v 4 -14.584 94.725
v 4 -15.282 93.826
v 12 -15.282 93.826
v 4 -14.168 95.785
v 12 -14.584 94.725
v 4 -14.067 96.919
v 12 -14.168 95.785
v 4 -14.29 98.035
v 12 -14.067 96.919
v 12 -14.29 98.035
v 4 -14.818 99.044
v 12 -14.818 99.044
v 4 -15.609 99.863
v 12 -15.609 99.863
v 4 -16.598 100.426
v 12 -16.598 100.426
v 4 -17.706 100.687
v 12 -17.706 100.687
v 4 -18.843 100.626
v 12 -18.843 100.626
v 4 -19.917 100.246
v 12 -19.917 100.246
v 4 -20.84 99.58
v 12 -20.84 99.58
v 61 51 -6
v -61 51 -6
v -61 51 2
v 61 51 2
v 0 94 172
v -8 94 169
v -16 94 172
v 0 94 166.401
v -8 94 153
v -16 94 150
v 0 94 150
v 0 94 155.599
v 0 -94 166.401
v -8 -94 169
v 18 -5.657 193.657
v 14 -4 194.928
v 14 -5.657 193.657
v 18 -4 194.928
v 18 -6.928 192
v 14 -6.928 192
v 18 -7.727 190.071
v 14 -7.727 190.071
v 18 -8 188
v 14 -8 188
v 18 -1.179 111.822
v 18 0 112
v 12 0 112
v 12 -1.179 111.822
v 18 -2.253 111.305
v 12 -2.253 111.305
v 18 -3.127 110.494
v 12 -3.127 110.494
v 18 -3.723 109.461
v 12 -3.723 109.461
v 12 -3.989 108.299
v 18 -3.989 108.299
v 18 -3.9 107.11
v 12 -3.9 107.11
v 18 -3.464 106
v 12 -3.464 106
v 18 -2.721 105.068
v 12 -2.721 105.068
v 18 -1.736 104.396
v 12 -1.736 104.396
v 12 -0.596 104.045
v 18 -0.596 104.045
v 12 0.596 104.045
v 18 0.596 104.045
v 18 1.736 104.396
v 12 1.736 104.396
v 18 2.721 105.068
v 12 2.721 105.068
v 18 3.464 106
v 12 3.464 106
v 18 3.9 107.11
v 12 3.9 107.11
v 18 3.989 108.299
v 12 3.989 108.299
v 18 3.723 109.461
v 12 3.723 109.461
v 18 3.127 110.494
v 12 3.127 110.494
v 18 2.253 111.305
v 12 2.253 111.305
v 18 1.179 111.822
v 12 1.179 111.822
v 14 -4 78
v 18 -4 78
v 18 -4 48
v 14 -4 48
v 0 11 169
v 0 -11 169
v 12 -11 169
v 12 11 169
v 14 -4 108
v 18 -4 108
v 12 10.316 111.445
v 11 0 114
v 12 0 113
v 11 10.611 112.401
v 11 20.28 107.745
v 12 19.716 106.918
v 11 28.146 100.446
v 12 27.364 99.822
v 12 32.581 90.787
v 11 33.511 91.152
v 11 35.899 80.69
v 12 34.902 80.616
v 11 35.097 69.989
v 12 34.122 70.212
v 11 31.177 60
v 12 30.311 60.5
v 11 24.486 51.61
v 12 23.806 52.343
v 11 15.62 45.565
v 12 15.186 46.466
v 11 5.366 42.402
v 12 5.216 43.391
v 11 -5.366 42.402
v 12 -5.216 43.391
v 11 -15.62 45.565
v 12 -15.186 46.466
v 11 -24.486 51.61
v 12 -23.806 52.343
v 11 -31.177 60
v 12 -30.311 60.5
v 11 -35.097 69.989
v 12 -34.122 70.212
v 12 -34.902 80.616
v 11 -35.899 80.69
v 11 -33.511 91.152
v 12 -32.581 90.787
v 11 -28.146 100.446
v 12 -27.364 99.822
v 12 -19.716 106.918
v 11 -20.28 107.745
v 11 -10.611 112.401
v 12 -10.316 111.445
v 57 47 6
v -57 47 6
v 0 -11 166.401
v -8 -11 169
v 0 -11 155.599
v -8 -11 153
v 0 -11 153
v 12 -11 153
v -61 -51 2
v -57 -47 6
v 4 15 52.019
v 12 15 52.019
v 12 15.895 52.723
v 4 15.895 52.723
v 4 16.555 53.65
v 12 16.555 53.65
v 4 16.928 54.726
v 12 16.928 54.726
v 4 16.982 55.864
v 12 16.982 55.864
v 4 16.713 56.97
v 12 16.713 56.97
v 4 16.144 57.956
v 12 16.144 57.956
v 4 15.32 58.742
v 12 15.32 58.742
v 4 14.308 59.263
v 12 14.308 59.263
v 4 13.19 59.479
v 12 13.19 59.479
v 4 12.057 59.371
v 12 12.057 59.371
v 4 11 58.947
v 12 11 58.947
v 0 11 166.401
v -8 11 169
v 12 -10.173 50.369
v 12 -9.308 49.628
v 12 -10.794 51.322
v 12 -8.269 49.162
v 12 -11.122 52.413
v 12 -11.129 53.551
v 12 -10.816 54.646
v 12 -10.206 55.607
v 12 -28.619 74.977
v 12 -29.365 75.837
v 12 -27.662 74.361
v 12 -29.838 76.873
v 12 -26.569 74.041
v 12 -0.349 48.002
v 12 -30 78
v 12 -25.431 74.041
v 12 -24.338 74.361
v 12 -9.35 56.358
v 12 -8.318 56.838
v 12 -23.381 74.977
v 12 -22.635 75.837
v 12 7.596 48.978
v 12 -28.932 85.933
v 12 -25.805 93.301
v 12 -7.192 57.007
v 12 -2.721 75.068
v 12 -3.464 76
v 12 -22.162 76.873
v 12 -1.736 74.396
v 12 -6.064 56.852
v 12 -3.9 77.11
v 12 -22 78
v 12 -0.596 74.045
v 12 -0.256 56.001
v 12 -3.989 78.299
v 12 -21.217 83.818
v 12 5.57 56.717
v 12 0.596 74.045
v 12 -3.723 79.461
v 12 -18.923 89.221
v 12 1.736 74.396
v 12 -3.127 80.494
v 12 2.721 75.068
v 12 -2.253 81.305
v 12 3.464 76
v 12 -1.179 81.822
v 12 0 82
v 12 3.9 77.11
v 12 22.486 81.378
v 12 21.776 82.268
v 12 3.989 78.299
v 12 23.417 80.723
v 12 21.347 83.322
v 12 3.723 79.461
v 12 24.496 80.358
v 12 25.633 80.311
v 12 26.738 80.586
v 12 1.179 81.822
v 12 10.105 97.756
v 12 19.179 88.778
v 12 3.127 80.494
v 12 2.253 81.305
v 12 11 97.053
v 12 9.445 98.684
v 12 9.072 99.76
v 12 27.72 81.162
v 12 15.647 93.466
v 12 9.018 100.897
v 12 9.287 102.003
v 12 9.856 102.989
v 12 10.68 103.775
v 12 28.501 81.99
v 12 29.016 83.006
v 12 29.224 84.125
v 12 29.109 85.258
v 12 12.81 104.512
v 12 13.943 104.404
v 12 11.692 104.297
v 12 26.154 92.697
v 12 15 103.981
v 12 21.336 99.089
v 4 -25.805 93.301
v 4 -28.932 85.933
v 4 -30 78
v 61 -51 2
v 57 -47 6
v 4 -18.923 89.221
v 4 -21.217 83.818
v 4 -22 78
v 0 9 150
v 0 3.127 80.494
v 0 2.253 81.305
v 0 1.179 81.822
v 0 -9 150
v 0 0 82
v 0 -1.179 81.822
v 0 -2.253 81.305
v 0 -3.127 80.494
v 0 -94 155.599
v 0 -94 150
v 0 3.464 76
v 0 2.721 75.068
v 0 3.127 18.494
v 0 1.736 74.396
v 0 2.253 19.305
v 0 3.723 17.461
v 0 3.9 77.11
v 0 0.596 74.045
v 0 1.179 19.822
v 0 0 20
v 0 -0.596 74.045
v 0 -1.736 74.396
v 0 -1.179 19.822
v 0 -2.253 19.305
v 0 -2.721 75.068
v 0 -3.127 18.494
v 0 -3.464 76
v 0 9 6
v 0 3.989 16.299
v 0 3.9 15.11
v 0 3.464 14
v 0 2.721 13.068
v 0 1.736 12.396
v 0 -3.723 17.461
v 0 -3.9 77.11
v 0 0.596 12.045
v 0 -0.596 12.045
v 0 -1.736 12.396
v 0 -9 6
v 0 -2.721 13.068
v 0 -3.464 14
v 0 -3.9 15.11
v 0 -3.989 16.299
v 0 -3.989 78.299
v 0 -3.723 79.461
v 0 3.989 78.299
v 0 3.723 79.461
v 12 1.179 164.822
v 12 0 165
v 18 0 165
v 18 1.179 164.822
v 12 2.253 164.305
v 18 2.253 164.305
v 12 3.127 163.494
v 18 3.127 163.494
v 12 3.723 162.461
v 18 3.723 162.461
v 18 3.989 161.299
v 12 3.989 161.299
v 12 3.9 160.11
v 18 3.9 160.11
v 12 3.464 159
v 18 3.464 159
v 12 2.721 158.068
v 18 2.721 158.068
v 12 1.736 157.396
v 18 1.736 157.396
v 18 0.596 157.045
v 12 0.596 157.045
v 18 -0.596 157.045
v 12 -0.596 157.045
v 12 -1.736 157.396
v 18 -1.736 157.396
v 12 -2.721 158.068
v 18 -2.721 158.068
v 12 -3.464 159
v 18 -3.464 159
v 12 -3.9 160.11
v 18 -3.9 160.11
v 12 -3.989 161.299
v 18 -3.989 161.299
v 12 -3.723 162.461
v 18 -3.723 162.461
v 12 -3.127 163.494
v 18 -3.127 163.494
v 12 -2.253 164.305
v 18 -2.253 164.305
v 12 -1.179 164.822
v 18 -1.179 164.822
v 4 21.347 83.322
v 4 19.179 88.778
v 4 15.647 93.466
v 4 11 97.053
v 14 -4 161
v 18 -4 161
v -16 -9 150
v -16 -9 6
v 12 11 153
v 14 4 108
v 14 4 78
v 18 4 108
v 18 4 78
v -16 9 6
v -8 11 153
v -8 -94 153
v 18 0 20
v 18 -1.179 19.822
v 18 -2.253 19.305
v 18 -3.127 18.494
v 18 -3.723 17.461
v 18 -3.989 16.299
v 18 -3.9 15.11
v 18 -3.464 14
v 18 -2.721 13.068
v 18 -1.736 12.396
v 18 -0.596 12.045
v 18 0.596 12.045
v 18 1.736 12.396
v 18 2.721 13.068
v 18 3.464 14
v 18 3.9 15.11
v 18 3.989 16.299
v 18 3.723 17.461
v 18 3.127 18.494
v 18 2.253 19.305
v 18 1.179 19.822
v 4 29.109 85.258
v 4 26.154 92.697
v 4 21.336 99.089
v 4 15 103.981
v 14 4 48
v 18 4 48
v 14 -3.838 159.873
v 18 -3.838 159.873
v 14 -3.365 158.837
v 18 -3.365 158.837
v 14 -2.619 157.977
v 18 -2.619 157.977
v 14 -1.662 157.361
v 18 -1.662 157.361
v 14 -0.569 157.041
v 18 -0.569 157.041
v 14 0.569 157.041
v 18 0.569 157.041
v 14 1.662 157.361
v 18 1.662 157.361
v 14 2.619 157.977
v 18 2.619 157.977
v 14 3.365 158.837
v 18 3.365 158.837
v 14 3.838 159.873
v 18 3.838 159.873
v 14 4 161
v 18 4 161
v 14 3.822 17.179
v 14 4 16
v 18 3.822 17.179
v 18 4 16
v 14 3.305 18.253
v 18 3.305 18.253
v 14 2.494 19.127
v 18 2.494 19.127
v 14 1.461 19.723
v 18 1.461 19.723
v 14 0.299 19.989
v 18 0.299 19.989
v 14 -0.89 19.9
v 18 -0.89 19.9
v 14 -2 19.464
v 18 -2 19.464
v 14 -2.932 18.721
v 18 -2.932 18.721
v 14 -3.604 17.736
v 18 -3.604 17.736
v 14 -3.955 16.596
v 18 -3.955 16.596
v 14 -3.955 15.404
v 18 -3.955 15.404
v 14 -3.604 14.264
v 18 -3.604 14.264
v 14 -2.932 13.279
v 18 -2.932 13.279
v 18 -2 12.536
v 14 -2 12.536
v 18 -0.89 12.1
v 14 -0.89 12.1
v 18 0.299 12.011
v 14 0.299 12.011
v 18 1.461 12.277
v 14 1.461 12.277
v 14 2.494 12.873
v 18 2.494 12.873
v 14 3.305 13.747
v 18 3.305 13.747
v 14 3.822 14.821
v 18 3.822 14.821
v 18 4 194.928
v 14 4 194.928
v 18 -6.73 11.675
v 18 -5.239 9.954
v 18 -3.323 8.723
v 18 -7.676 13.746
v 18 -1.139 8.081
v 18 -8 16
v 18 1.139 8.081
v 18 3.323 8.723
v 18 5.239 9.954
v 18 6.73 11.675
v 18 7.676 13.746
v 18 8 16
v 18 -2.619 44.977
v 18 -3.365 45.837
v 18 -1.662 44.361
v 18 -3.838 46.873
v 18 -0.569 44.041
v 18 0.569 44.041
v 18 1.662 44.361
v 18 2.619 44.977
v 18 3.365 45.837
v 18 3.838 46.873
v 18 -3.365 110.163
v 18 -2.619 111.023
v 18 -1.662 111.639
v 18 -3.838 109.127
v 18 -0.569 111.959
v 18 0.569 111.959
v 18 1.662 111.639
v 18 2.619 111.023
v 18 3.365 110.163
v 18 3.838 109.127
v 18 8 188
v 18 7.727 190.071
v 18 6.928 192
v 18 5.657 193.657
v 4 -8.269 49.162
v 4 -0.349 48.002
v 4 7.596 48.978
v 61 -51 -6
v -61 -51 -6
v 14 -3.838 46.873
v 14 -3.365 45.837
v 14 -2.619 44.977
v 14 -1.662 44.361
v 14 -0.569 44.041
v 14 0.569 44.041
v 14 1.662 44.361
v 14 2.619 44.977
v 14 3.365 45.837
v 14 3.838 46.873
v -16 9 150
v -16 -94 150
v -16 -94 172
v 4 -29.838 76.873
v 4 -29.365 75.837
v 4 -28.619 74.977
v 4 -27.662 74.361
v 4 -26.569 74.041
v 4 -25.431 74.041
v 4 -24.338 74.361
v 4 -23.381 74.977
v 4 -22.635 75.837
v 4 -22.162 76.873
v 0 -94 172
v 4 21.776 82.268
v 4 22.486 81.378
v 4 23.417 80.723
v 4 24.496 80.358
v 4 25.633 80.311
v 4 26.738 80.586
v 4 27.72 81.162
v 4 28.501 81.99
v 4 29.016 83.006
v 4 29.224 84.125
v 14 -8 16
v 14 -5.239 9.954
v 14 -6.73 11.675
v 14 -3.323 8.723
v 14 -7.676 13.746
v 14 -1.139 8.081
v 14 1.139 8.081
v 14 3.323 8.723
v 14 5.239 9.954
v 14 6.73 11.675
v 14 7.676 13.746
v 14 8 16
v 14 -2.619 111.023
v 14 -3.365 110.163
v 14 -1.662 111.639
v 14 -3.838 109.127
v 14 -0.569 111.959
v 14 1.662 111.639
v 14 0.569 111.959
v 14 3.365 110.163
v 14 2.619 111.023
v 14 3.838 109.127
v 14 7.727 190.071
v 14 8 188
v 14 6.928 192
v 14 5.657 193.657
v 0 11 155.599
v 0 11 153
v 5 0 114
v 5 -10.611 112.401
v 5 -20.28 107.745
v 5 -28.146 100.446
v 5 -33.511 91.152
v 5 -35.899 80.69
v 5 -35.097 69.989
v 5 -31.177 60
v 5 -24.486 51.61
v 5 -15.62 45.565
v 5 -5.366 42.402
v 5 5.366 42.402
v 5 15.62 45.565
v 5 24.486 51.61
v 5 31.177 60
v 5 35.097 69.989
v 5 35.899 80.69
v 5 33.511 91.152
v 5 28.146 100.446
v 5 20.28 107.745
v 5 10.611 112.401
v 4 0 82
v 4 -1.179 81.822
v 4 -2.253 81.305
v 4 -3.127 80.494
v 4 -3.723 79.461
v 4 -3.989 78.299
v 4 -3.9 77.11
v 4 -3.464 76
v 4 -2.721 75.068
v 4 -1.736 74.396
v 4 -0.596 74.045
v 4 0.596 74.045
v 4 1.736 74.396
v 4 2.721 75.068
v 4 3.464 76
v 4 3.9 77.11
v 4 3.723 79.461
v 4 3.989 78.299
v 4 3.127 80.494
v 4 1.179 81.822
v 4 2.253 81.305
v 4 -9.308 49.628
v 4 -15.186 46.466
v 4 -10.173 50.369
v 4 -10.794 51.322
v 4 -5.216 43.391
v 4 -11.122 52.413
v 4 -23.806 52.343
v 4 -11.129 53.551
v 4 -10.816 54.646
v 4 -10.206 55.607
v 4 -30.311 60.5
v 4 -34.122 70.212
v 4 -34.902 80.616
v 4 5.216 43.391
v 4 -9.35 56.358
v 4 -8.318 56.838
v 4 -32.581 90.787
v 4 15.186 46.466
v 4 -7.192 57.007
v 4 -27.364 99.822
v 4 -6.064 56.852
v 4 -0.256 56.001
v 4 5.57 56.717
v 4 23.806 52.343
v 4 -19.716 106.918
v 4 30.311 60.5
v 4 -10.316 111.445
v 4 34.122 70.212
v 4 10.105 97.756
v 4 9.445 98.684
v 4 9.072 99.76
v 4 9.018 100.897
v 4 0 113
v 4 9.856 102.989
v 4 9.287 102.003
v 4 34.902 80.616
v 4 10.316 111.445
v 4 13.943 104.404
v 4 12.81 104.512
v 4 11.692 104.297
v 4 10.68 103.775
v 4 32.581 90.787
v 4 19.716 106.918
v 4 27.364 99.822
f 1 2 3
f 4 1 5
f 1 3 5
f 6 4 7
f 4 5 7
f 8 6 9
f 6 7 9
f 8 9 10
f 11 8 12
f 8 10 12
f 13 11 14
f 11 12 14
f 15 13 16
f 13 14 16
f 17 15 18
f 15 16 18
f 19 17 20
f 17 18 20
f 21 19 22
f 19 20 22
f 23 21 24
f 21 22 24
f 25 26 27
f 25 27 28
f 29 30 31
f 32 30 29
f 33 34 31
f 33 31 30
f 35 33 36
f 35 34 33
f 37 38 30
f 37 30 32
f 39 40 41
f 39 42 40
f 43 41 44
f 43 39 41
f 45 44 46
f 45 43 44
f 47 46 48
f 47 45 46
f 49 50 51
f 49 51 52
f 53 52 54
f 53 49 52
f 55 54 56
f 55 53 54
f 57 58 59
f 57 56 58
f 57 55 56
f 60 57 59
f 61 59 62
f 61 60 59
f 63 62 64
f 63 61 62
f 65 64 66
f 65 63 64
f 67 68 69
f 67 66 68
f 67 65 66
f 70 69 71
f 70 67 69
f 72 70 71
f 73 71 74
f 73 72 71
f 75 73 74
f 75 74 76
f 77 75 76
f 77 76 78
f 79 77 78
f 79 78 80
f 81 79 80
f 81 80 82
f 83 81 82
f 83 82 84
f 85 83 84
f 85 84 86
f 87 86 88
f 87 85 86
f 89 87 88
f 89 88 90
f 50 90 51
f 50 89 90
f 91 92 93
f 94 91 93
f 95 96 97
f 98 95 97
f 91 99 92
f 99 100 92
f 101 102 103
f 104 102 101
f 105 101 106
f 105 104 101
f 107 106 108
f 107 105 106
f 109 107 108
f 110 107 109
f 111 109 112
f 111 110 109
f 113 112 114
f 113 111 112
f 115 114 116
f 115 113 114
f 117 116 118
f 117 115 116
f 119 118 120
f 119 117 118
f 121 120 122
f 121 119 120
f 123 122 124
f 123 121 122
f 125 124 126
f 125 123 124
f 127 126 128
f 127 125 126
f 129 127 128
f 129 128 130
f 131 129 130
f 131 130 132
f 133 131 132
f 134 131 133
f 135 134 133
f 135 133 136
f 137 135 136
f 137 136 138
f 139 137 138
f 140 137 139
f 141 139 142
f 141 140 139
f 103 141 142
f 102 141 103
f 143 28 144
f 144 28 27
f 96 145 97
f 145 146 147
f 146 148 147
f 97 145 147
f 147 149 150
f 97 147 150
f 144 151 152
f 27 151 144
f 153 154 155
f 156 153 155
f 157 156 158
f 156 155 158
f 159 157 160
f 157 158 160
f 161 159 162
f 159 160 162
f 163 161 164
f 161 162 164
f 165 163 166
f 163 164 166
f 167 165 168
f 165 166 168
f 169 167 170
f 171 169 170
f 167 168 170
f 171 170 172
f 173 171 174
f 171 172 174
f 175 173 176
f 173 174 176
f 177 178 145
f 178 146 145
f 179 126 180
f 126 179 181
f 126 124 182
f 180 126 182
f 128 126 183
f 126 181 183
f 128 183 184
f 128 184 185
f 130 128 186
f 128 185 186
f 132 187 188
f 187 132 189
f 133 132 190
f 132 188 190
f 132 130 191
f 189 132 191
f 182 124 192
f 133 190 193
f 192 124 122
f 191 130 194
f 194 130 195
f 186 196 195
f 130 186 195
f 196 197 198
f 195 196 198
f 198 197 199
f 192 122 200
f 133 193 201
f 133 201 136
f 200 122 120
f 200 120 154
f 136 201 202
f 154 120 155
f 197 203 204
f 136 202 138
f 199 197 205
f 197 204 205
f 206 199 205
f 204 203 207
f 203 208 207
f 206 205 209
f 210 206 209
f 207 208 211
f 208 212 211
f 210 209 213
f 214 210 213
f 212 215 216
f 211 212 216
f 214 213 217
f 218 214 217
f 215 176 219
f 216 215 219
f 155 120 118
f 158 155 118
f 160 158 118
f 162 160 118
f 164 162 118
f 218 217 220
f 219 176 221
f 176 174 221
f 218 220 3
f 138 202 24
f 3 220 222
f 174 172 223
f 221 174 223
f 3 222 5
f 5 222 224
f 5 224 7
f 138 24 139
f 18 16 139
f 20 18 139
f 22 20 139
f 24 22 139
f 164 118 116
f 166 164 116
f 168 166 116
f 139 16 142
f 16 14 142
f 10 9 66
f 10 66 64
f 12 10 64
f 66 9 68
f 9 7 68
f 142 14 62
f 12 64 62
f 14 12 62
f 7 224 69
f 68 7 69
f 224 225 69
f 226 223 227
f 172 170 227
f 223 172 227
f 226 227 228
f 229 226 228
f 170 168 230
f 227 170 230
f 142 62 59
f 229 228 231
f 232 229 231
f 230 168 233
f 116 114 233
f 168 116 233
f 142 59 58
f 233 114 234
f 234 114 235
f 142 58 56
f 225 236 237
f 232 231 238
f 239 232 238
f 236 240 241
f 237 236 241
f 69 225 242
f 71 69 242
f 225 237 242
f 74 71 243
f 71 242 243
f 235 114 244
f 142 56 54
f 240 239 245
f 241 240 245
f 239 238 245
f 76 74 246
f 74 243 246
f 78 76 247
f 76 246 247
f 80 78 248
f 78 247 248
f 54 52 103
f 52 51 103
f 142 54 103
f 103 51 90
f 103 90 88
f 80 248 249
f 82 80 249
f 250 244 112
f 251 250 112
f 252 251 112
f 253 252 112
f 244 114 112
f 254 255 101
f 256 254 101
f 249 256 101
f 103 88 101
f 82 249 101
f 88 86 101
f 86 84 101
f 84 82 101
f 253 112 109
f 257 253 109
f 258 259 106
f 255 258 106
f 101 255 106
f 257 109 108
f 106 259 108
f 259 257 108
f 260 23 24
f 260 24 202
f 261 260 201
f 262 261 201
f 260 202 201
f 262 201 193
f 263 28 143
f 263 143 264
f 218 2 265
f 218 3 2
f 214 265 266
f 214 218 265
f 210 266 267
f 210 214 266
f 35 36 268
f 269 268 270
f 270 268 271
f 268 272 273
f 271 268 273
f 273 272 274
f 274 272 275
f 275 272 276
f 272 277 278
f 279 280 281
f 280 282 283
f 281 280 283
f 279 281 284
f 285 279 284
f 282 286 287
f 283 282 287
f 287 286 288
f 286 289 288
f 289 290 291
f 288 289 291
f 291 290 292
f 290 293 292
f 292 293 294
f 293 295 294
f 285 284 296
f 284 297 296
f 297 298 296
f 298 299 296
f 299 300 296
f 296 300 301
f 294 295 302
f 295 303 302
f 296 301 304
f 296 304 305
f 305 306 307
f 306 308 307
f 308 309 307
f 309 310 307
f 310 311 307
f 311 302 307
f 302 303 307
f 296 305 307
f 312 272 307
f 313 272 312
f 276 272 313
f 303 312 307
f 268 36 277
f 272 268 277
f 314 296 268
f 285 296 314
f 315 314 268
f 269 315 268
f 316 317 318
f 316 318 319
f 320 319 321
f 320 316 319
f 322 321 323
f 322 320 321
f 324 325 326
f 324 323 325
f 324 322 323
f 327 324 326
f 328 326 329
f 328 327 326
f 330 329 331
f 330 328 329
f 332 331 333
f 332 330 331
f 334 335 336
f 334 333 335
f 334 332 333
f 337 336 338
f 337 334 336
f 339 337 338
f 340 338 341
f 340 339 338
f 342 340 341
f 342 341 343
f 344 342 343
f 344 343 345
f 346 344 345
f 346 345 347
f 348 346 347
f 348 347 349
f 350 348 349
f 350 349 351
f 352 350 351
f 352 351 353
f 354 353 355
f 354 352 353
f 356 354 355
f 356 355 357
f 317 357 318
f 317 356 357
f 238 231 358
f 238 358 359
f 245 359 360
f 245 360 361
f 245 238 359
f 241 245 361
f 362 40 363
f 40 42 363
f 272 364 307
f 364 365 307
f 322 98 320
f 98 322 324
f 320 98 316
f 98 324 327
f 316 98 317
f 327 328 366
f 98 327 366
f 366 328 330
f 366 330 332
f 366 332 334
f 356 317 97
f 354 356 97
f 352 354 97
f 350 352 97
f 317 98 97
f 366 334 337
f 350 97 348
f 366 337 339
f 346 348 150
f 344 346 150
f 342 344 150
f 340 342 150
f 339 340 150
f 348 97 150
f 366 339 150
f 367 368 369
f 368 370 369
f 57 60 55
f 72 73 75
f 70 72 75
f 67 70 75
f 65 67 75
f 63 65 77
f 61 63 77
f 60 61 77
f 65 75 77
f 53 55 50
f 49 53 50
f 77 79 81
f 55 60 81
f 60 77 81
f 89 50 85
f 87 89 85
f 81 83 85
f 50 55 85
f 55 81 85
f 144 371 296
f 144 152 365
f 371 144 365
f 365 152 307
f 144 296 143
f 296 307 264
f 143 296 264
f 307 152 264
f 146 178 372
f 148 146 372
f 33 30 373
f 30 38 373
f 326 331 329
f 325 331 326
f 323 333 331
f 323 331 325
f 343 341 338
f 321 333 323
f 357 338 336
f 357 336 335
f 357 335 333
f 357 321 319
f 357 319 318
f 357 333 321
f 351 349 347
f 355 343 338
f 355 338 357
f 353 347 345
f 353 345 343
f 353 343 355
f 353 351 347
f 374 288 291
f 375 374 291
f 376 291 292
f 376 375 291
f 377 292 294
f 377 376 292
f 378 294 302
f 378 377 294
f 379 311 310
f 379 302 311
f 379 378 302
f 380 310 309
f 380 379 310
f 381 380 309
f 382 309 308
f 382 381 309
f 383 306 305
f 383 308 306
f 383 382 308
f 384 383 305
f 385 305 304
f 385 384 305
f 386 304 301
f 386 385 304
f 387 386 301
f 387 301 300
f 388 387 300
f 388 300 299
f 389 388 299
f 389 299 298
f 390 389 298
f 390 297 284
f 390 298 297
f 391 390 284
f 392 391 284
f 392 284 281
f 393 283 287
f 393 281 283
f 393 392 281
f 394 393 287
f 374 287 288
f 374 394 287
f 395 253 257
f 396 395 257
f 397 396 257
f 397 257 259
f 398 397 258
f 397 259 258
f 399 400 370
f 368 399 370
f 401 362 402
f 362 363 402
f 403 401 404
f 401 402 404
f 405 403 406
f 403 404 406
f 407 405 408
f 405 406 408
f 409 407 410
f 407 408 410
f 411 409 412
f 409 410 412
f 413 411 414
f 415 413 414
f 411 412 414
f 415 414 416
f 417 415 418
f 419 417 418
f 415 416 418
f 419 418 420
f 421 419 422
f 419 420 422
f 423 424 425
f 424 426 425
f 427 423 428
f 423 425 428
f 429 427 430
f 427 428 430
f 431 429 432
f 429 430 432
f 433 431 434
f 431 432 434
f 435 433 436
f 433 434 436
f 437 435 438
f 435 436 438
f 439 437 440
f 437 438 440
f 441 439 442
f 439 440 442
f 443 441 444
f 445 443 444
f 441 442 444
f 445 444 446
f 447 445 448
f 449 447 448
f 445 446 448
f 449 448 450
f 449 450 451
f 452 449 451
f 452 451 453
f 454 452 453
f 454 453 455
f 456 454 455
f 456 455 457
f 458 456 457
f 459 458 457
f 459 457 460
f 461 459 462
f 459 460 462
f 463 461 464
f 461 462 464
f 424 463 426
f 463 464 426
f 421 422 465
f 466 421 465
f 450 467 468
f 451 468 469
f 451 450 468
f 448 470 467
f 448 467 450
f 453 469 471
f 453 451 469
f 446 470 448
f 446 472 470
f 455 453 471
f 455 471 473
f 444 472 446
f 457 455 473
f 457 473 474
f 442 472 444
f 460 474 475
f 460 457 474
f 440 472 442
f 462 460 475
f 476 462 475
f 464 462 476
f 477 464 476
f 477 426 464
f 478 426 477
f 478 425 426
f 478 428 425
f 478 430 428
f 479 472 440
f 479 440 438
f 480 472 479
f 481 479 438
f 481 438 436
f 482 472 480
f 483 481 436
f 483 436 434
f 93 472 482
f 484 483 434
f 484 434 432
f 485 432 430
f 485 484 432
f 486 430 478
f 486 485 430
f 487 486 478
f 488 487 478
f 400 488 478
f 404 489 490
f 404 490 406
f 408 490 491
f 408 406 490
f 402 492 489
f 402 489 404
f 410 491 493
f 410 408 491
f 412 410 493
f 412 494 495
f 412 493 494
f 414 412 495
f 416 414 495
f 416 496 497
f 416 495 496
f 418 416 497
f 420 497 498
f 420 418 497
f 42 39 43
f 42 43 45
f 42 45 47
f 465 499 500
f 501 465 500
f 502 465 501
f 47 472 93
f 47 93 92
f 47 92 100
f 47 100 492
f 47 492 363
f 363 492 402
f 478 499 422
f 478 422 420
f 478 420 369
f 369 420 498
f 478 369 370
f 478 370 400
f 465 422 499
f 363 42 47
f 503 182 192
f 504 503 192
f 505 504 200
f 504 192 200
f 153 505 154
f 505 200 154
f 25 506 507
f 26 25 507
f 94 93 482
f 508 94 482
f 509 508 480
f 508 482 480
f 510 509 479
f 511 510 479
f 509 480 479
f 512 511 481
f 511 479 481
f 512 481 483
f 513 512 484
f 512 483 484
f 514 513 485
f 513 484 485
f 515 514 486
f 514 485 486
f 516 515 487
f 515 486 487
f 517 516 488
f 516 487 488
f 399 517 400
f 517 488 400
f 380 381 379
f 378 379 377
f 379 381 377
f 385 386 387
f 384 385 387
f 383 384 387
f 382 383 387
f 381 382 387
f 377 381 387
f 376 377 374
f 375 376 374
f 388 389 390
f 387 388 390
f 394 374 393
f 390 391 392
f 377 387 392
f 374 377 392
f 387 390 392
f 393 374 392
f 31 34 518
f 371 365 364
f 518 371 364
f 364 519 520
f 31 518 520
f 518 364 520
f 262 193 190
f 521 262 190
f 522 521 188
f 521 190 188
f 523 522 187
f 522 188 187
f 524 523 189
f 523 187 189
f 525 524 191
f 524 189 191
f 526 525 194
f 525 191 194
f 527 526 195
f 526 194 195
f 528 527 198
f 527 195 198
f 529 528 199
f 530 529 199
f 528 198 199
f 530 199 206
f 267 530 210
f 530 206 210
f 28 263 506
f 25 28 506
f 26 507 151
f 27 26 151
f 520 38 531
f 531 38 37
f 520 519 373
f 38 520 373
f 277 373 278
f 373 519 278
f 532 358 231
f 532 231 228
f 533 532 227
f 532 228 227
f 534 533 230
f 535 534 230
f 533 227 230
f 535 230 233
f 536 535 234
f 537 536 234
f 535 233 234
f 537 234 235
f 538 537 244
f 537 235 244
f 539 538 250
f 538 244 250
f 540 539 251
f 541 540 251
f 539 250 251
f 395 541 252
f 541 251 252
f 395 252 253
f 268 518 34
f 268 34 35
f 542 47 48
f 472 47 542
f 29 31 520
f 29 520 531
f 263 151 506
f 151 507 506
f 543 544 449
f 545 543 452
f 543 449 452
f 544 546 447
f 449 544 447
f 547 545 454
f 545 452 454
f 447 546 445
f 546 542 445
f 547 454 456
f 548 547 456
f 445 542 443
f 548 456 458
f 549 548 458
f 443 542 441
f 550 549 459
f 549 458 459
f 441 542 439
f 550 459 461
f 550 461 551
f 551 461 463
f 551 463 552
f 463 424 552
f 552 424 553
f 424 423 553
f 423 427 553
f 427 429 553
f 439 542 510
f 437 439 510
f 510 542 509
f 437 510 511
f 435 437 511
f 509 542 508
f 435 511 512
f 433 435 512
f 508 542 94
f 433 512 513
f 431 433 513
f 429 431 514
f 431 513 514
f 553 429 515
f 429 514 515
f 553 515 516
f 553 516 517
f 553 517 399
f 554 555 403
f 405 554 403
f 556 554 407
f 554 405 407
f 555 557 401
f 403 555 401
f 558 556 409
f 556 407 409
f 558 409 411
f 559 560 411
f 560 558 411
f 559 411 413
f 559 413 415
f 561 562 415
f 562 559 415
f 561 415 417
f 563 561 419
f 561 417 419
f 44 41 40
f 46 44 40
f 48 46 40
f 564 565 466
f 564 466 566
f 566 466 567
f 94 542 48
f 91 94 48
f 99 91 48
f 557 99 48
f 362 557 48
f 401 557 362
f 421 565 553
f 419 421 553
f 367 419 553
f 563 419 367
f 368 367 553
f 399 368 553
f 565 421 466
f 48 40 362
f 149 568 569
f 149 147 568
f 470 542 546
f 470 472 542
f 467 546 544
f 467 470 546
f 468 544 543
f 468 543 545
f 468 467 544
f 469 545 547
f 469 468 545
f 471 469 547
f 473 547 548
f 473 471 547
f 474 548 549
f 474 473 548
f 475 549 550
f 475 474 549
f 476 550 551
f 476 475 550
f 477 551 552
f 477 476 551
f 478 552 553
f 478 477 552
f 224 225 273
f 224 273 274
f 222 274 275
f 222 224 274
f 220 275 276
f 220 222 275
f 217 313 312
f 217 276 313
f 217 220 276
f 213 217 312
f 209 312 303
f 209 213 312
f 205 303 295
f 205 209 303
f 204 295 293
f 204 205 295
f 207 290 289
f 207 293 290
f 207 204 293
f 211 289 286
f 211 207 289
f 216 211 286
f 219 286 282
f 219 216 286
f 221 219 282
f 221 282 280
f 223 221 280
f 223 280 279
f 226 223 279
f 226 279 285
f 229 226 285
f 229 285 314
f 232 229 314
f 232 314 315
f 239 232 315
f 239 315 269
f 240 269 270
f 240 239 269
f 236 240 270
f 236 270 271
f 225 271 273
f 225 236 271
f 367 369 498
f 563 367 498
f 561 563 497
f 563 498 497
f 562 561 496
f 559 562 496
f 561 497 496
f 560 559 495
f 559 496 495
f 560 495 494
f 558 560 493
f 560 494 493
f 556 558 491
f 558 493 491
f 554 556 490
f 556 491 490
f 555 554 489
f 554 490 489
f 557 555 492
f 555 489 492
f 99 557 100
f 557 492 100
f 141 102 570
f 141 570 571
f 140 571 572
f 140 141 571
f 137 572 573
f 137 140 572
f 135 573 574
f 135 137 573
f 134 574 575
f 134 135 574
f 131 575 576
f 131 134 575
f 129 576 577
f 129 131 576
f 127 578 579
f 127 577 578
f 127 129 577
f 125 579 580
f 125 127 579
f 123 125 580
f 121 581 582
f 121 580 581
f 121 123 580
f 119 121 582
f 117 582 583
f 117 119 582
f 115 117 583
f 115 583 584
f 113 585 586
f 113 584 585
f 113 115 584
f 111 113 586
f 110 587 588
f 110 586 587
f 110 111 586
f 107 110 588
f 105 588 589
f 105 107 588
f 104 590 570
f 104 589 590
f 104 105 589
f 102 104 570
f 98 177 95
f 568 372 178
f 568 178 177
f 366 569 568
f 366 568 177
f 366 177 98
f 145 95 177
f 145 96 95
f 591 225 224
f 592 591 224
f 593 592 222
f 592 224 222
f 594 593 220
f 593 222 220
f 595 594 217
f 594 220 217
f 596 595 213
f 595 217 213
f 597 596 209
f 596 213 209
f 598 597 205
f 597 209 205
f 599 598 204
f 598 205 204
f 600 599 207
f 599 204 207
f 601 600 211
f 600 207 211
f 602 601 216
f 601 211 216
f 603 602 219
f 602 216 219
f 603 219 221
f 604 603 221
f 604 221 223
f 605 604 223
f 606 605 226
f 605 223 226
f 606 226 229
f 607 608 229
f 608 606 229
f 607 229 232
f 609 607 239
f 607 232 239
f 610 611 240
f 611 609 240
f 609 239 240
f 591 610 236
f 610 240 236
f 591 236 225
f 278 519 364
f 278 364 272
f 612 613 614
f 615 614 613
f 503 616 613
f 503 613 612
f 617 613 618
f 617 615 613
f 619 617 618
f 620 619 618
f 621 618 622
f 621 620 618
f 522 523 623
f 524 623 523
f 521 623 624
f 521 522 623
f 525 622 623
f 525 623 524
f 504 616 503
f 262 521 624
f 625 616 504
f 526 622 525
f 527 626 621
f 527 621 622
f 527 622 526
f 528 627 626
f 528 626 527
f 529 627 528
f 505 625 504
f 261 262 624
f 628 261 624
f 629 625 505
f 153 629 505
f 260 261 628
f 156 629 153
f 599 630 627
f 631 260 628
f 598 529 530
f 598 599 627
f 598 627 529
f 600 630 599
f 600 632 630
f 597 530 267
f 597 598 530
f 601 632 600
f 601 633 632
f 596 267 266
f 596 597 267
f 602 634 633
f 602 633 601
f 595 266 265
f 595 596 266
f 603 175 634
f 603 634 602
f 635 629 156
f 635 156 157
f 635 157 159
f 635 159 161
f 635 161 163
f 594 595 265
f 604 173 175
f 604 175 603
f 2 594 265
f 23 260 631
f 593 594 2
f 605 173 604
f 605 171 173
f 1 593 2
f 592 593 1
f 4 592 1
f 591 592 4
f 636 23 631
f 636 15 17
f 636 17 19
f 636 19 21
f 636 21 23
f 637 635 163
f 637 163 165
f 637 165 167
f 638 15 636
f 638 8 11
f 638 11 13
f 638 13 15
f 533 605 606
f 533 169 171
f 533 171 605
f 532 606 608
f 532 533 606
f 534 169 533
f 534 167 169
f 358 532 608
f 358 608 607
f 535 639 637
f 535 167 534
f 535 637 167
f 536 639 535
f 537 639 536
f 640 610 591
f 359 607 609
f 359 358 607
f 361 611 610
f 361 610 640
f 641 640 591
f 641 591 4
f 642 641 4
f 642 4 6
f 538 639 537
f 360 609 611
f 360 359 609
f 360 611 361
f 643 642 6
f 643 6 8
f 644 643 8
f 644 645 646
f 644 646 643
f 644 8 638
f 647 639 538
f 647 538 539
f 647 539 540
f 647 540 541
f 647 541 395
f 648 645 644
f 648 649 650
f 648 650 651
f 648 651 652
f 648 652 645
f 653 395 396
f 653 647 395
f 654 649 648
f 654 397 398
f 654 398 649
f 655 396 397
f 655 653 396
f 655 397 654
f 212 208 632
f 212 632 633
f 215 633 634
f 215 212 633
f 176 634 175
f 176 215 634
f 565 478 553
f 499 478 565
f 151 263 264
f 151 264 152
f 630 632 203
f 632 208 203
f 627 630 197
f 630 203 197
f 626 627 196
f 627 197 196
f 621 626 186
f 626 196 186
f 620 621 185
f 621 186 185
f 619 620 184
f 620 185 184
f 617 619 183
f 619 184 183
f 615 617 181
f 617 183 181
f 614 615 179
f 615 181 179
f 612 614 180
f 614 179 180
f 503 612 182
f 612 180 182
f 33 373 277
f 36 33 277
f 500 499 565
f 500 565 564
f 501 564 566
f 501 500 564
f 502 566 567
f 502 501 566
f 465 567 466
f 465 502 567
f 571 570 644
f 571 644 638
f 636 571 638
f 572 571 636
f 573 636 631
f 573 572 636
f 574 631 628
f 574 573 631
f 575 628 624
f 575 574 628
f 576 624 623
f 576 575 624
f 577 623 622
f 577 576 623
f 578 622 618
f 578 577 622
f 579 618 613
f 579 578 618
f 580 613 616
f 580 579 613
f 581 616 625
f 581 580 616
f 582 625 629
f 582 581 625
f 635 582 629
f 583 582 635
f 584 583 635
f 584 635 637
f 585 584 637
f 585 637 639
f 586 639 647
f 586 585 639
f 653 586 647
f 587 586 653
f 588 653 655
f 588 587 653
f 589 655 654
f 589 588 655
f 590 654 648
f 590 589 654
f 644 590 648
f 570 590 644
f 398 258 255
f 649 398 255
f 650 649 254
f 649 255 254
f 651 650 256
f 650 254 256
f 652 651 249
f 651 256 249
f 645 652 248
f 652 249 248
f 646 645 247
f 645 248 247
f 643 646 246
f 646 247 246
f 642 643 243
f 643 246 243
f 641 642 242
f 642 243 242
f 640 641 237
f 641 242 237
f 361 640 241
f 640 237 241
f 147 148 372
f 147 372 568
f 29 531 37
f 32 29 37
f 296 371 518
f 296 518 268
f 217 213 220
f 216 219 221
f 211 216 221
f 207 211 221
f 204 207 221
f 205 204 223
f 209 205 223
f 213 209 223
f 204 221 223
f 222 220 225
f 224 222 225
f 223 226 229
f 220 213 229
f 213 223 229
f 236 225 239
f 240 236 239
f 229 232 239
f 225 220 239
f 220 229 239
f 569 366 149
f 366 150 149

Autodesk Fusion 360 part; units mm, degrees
sketch "Sketch1" plane through (0, 0, 0) normal (0, 1, 0) x (1, 0, 0)
  line L0 (61, 6) -> (-61, 6)
  line L1 (-61, 6) -> (-61, -6)
  line L2 (-61, -6) -> (61, -6)
  line L3 (61, -6) -> (61, 6)
  line L4 (61, 6) -> (-61, -6) construction
  line L5 (-61, 6) -> (61, -6) construction
  line L6 (-16, -172) -> (0, -172)
  line L7 (0, -172) -> (0, -6)
  line L8 (0, -6) -> (-16, -6)
  line L9 (-16, -6) -> (-16, -172)
  line L10 (0, -20) -> (18, -20)
  line L11 (18, -20) -> (18, -16)
  line L12 (18, -16) -> (0, -16)
  line L13 (0, -16) -> (0, -20)
  line L14 (0, -82) -> (12, -82)
  line L15 (12, -82) -> (12, -78)
  line L16 (12, -78) -> (0, -78)
  line L17 (0, -78) -> (0, -82)
  line L18 (0, -169) -> (12, -169)
  line L19 (12, -169) -> (12, -153)
  line L20 (12, -153) -> (0, -153)
  line L21 (0, -153) -> (0, -169)
  line L22 (12, -161) -> (18, -161)
  line L23 (18, -161) -> (18, -165)
  line L24 (18, -165) -> (12, -165)
  line L25 (12, -165) -> (12, -161)
  line L26 (0, -161) -> (-8, -161) construction
  line L27 (-8, -161) -> (-8, -169)
  line L28 (-8, -169) -> (0, -166.4006)
  line L29 (-8, -161) -> (-8, -153)
  line L30 (-8, -153) -> (0, -155.5994)
  line L31 (-16, -150) -> (0, -150)
  line L32 (4, -114) -> (12, -114)
  line L33 (12, -114) -> (12, -82)
  line L34 (12, -82) -> (4, -82)
  line L35 (4, -82) -> (4, -114)
  line L36 (12, -112) -> (18, -112)
  line L37 (18, -112) -> (18, -108)
  line L38 (18, -108) -> (12, -108)
  line L39 (12, -108) -> (12, -112)
  dimension "d31" = 122
  dimension "d32" = 12
  dimension "d33" = 166
  dimension "d34" = 16
  dimension "d35" = 10
  dimension "d36" = 4
  dimension "d37" = 72
  dimension "d38" = 4
  dimension "d39" = 3
  dimension "d40" = 16
  dimension "d41" = 12
  dimension "d42" = 6
  dimension "d43" = 4
  dimension "d44" = 8
  dimension "d45" = 8
  dimension "d46" = 18
  dimension "d47" = -22
  dimension "d48" = 32
  dimension "d49" = 8
  dimension "d50" = 2
  dimension "d51" = 4
extrude "Extrude1" add sketch "Sketch1" along normal mid plane 102 contours L0 L1 L2 L3 L8 makes body 1
extrude "Extrude2" add sketch "Sketch1" along normal mid plane 18 contours L2 L7 L8 L9 L13 L17 L31 bodies 1
extrude "Extrude3" add sketch "Sketch1" along normal mid plane 188 contours L6 L7 L9 L21 L27 L28 L29 L30 L31 bodies 1
extrude "Extrude4" add sketch "Sketch1" along normal mid plane 22 separate body contours L7 L18 L19 L20 L21 L25 | L7 L21 L27 L28 L29 L30 makes body 2
revolve "Revolve1" add sketch "Sketch1" angle 360 about axis through (12, 0, 161) along (1, 0, 0) contours L19 L22 L23 L24 L25 bodies 2
revolve "Revolve2" add sketch "Sketch1" angle 360 about axis through (12, 0, 78) along (-1, 0, 0) contours L7 L14 L15 L16 L17 L34 bodies 1
revolve "Revolve3" add sketch "Sketch1" angle 360 about axis through (12, 0, 78) along (-1, 0, 0) separate body contours L14 L32 L33 L34 L35 L39 makes body 3
revolve "Revolve4" add sketch "Sketch1" angle 360 about axis through (18, 0, 108) along (-1, 0, 0) contours L33 L36 L37 L38 L39 bodies 3
revolve "Revolve5" add sketch "Sketch1" angle 360 about axis through (18, 0, 16) along (-1, 0, 0) contours L7 L10 L11 L12 L13 bodies 1
sketch "Sketch2" plane through (12, 0, 0) normal (1, 0, 0) x (0, 1, 0)
  circle A0 centre (0, 108) radius 4
  circle A1 centre (0, 78) radius 4
  circle A2 centre (0, 78) radius 36
  arc A3 (-20.8398, 99.5802) -> (-30, 78) centre (0, 78) ccw
  arc A4 (-15.2825, 93.8255) -> (-20.8398, 99.5802) centre (-18.0611, 96.7028) ccw
  arc A5 (-15.2825, 93.8255) -> (-22, 78) centre (0, 78) ccw
  arc A6 (-30, 78) -> (-22, 78) centre (-26, 78) ccw
  arc A7 (-18.0611, 96.7028) -> (-26, 78) centre (0, 78) ccw construction
  point P0 (0, 78)
  dimension "d65" = 26
  dimension "d66" = 4
  dimension "d67" = 46
extrude "Extrude5" cut sketch "Sketch2" against normal up to surface (8 mm away) contours A3 A4 A5 A6 bodies 3
pattern_circular "C-Pattern1" count 3 over 360 about axis through (12, 0, 78) along (-1, 0, 0) of "Extrude5"
sketch "Sketch3" plane through (18, 0, 0) normal (1, 0, 0) x (0, 1, 0)
  circle A0 centre (0, 16) radius 4
  line L0 (8, 16) -> (8, 188)
  arc A1 (8, 188) -> (-8, 188) centre (0, 188) ccw
  line L1 (-8, 188) -> (-8, 16)
  arc A2 (-8, 16) -> (8, 16) centre (0, 16) ccw
  line L2 (0, 16) -> (0, 188) construction
  circle A3 centre (0, 161) radius 4
  circle A4 centre (0, 108) radius 4
  circle A5 centre (0, 78) radius 4
  circle A6 centre (0, 16) radius 4
  line L3 (4, 161) -> (4, 196)
  arc A7 (4, 196) -> (-4, 196) centre (0, 196) ccw
  line L4 (-4, 196) -> (-4, 161)
  arc A8 (-4, 161) -> (4, 161) centre (0, 161) ccw
  line L5 (0, 161) -> (0, 196) construction
  line L6 (-4, 108) -> (-4, 48)
  arc A9 (-4, 48) -> (4, 48) centre (0, 48) ccw
  line L7 (4, 48) -> (4, 108)
  arc A10 (4, 108) -> (-4, 108) centre (0, 108) ccw
  line L8 (0, 108) -> (0, 48) construction
  dimension "d72" = 172
  dimension "d73" = 8
  dimension "d74" = 60
extrude "Extrude6" add sketch "Sketch3" against normal blind 4 separate body contours L0 A1 L1 A2 A3 L3 L4 A8 makes body 4
chamfer "Chamfer1" distance 1 angle 45 2 edges at (12, -13.0182, 44.4362) (4, -13.0182, 44.4362) on bodies 3
chamfer "Chamfer2" distance 4 angle 45 4 edges at (-61, 0, 6) (0, -51, 6) (61, 0, 6) (0, 51, 6) on bodies 1
copy_body "Body->Comp1" bodies 2 removing the originals makes body 5 in component "slider"
copy_body "Body->Comp2" bodies 3 removing the originals makes body 6 in component "disk"
copy_body "Body->Comp3" bodies 4 removing the originals makes body 7 in component "crank"
copy_body "Body->Comp4" bodies 1 removing the originals makes body 8 in component "base"
component "disk" placed x (1, 0, 0) y (0, 1, 0) z (0, 0, 1) at (0, 0, 0)
component "crank" placed x (1, 0, 0) y (0, 1, 0) z (0, 0, 1) at (0, 0, 0)
component "slider" placed x (1, 0, 0) y (0, 1, 0) z (0, 0, 1) at (0, 0, 0)
component "base" placed x (1, 0, 0) y (0, 1, 0) z (0, 0, 1) at (0, 0, 0)
